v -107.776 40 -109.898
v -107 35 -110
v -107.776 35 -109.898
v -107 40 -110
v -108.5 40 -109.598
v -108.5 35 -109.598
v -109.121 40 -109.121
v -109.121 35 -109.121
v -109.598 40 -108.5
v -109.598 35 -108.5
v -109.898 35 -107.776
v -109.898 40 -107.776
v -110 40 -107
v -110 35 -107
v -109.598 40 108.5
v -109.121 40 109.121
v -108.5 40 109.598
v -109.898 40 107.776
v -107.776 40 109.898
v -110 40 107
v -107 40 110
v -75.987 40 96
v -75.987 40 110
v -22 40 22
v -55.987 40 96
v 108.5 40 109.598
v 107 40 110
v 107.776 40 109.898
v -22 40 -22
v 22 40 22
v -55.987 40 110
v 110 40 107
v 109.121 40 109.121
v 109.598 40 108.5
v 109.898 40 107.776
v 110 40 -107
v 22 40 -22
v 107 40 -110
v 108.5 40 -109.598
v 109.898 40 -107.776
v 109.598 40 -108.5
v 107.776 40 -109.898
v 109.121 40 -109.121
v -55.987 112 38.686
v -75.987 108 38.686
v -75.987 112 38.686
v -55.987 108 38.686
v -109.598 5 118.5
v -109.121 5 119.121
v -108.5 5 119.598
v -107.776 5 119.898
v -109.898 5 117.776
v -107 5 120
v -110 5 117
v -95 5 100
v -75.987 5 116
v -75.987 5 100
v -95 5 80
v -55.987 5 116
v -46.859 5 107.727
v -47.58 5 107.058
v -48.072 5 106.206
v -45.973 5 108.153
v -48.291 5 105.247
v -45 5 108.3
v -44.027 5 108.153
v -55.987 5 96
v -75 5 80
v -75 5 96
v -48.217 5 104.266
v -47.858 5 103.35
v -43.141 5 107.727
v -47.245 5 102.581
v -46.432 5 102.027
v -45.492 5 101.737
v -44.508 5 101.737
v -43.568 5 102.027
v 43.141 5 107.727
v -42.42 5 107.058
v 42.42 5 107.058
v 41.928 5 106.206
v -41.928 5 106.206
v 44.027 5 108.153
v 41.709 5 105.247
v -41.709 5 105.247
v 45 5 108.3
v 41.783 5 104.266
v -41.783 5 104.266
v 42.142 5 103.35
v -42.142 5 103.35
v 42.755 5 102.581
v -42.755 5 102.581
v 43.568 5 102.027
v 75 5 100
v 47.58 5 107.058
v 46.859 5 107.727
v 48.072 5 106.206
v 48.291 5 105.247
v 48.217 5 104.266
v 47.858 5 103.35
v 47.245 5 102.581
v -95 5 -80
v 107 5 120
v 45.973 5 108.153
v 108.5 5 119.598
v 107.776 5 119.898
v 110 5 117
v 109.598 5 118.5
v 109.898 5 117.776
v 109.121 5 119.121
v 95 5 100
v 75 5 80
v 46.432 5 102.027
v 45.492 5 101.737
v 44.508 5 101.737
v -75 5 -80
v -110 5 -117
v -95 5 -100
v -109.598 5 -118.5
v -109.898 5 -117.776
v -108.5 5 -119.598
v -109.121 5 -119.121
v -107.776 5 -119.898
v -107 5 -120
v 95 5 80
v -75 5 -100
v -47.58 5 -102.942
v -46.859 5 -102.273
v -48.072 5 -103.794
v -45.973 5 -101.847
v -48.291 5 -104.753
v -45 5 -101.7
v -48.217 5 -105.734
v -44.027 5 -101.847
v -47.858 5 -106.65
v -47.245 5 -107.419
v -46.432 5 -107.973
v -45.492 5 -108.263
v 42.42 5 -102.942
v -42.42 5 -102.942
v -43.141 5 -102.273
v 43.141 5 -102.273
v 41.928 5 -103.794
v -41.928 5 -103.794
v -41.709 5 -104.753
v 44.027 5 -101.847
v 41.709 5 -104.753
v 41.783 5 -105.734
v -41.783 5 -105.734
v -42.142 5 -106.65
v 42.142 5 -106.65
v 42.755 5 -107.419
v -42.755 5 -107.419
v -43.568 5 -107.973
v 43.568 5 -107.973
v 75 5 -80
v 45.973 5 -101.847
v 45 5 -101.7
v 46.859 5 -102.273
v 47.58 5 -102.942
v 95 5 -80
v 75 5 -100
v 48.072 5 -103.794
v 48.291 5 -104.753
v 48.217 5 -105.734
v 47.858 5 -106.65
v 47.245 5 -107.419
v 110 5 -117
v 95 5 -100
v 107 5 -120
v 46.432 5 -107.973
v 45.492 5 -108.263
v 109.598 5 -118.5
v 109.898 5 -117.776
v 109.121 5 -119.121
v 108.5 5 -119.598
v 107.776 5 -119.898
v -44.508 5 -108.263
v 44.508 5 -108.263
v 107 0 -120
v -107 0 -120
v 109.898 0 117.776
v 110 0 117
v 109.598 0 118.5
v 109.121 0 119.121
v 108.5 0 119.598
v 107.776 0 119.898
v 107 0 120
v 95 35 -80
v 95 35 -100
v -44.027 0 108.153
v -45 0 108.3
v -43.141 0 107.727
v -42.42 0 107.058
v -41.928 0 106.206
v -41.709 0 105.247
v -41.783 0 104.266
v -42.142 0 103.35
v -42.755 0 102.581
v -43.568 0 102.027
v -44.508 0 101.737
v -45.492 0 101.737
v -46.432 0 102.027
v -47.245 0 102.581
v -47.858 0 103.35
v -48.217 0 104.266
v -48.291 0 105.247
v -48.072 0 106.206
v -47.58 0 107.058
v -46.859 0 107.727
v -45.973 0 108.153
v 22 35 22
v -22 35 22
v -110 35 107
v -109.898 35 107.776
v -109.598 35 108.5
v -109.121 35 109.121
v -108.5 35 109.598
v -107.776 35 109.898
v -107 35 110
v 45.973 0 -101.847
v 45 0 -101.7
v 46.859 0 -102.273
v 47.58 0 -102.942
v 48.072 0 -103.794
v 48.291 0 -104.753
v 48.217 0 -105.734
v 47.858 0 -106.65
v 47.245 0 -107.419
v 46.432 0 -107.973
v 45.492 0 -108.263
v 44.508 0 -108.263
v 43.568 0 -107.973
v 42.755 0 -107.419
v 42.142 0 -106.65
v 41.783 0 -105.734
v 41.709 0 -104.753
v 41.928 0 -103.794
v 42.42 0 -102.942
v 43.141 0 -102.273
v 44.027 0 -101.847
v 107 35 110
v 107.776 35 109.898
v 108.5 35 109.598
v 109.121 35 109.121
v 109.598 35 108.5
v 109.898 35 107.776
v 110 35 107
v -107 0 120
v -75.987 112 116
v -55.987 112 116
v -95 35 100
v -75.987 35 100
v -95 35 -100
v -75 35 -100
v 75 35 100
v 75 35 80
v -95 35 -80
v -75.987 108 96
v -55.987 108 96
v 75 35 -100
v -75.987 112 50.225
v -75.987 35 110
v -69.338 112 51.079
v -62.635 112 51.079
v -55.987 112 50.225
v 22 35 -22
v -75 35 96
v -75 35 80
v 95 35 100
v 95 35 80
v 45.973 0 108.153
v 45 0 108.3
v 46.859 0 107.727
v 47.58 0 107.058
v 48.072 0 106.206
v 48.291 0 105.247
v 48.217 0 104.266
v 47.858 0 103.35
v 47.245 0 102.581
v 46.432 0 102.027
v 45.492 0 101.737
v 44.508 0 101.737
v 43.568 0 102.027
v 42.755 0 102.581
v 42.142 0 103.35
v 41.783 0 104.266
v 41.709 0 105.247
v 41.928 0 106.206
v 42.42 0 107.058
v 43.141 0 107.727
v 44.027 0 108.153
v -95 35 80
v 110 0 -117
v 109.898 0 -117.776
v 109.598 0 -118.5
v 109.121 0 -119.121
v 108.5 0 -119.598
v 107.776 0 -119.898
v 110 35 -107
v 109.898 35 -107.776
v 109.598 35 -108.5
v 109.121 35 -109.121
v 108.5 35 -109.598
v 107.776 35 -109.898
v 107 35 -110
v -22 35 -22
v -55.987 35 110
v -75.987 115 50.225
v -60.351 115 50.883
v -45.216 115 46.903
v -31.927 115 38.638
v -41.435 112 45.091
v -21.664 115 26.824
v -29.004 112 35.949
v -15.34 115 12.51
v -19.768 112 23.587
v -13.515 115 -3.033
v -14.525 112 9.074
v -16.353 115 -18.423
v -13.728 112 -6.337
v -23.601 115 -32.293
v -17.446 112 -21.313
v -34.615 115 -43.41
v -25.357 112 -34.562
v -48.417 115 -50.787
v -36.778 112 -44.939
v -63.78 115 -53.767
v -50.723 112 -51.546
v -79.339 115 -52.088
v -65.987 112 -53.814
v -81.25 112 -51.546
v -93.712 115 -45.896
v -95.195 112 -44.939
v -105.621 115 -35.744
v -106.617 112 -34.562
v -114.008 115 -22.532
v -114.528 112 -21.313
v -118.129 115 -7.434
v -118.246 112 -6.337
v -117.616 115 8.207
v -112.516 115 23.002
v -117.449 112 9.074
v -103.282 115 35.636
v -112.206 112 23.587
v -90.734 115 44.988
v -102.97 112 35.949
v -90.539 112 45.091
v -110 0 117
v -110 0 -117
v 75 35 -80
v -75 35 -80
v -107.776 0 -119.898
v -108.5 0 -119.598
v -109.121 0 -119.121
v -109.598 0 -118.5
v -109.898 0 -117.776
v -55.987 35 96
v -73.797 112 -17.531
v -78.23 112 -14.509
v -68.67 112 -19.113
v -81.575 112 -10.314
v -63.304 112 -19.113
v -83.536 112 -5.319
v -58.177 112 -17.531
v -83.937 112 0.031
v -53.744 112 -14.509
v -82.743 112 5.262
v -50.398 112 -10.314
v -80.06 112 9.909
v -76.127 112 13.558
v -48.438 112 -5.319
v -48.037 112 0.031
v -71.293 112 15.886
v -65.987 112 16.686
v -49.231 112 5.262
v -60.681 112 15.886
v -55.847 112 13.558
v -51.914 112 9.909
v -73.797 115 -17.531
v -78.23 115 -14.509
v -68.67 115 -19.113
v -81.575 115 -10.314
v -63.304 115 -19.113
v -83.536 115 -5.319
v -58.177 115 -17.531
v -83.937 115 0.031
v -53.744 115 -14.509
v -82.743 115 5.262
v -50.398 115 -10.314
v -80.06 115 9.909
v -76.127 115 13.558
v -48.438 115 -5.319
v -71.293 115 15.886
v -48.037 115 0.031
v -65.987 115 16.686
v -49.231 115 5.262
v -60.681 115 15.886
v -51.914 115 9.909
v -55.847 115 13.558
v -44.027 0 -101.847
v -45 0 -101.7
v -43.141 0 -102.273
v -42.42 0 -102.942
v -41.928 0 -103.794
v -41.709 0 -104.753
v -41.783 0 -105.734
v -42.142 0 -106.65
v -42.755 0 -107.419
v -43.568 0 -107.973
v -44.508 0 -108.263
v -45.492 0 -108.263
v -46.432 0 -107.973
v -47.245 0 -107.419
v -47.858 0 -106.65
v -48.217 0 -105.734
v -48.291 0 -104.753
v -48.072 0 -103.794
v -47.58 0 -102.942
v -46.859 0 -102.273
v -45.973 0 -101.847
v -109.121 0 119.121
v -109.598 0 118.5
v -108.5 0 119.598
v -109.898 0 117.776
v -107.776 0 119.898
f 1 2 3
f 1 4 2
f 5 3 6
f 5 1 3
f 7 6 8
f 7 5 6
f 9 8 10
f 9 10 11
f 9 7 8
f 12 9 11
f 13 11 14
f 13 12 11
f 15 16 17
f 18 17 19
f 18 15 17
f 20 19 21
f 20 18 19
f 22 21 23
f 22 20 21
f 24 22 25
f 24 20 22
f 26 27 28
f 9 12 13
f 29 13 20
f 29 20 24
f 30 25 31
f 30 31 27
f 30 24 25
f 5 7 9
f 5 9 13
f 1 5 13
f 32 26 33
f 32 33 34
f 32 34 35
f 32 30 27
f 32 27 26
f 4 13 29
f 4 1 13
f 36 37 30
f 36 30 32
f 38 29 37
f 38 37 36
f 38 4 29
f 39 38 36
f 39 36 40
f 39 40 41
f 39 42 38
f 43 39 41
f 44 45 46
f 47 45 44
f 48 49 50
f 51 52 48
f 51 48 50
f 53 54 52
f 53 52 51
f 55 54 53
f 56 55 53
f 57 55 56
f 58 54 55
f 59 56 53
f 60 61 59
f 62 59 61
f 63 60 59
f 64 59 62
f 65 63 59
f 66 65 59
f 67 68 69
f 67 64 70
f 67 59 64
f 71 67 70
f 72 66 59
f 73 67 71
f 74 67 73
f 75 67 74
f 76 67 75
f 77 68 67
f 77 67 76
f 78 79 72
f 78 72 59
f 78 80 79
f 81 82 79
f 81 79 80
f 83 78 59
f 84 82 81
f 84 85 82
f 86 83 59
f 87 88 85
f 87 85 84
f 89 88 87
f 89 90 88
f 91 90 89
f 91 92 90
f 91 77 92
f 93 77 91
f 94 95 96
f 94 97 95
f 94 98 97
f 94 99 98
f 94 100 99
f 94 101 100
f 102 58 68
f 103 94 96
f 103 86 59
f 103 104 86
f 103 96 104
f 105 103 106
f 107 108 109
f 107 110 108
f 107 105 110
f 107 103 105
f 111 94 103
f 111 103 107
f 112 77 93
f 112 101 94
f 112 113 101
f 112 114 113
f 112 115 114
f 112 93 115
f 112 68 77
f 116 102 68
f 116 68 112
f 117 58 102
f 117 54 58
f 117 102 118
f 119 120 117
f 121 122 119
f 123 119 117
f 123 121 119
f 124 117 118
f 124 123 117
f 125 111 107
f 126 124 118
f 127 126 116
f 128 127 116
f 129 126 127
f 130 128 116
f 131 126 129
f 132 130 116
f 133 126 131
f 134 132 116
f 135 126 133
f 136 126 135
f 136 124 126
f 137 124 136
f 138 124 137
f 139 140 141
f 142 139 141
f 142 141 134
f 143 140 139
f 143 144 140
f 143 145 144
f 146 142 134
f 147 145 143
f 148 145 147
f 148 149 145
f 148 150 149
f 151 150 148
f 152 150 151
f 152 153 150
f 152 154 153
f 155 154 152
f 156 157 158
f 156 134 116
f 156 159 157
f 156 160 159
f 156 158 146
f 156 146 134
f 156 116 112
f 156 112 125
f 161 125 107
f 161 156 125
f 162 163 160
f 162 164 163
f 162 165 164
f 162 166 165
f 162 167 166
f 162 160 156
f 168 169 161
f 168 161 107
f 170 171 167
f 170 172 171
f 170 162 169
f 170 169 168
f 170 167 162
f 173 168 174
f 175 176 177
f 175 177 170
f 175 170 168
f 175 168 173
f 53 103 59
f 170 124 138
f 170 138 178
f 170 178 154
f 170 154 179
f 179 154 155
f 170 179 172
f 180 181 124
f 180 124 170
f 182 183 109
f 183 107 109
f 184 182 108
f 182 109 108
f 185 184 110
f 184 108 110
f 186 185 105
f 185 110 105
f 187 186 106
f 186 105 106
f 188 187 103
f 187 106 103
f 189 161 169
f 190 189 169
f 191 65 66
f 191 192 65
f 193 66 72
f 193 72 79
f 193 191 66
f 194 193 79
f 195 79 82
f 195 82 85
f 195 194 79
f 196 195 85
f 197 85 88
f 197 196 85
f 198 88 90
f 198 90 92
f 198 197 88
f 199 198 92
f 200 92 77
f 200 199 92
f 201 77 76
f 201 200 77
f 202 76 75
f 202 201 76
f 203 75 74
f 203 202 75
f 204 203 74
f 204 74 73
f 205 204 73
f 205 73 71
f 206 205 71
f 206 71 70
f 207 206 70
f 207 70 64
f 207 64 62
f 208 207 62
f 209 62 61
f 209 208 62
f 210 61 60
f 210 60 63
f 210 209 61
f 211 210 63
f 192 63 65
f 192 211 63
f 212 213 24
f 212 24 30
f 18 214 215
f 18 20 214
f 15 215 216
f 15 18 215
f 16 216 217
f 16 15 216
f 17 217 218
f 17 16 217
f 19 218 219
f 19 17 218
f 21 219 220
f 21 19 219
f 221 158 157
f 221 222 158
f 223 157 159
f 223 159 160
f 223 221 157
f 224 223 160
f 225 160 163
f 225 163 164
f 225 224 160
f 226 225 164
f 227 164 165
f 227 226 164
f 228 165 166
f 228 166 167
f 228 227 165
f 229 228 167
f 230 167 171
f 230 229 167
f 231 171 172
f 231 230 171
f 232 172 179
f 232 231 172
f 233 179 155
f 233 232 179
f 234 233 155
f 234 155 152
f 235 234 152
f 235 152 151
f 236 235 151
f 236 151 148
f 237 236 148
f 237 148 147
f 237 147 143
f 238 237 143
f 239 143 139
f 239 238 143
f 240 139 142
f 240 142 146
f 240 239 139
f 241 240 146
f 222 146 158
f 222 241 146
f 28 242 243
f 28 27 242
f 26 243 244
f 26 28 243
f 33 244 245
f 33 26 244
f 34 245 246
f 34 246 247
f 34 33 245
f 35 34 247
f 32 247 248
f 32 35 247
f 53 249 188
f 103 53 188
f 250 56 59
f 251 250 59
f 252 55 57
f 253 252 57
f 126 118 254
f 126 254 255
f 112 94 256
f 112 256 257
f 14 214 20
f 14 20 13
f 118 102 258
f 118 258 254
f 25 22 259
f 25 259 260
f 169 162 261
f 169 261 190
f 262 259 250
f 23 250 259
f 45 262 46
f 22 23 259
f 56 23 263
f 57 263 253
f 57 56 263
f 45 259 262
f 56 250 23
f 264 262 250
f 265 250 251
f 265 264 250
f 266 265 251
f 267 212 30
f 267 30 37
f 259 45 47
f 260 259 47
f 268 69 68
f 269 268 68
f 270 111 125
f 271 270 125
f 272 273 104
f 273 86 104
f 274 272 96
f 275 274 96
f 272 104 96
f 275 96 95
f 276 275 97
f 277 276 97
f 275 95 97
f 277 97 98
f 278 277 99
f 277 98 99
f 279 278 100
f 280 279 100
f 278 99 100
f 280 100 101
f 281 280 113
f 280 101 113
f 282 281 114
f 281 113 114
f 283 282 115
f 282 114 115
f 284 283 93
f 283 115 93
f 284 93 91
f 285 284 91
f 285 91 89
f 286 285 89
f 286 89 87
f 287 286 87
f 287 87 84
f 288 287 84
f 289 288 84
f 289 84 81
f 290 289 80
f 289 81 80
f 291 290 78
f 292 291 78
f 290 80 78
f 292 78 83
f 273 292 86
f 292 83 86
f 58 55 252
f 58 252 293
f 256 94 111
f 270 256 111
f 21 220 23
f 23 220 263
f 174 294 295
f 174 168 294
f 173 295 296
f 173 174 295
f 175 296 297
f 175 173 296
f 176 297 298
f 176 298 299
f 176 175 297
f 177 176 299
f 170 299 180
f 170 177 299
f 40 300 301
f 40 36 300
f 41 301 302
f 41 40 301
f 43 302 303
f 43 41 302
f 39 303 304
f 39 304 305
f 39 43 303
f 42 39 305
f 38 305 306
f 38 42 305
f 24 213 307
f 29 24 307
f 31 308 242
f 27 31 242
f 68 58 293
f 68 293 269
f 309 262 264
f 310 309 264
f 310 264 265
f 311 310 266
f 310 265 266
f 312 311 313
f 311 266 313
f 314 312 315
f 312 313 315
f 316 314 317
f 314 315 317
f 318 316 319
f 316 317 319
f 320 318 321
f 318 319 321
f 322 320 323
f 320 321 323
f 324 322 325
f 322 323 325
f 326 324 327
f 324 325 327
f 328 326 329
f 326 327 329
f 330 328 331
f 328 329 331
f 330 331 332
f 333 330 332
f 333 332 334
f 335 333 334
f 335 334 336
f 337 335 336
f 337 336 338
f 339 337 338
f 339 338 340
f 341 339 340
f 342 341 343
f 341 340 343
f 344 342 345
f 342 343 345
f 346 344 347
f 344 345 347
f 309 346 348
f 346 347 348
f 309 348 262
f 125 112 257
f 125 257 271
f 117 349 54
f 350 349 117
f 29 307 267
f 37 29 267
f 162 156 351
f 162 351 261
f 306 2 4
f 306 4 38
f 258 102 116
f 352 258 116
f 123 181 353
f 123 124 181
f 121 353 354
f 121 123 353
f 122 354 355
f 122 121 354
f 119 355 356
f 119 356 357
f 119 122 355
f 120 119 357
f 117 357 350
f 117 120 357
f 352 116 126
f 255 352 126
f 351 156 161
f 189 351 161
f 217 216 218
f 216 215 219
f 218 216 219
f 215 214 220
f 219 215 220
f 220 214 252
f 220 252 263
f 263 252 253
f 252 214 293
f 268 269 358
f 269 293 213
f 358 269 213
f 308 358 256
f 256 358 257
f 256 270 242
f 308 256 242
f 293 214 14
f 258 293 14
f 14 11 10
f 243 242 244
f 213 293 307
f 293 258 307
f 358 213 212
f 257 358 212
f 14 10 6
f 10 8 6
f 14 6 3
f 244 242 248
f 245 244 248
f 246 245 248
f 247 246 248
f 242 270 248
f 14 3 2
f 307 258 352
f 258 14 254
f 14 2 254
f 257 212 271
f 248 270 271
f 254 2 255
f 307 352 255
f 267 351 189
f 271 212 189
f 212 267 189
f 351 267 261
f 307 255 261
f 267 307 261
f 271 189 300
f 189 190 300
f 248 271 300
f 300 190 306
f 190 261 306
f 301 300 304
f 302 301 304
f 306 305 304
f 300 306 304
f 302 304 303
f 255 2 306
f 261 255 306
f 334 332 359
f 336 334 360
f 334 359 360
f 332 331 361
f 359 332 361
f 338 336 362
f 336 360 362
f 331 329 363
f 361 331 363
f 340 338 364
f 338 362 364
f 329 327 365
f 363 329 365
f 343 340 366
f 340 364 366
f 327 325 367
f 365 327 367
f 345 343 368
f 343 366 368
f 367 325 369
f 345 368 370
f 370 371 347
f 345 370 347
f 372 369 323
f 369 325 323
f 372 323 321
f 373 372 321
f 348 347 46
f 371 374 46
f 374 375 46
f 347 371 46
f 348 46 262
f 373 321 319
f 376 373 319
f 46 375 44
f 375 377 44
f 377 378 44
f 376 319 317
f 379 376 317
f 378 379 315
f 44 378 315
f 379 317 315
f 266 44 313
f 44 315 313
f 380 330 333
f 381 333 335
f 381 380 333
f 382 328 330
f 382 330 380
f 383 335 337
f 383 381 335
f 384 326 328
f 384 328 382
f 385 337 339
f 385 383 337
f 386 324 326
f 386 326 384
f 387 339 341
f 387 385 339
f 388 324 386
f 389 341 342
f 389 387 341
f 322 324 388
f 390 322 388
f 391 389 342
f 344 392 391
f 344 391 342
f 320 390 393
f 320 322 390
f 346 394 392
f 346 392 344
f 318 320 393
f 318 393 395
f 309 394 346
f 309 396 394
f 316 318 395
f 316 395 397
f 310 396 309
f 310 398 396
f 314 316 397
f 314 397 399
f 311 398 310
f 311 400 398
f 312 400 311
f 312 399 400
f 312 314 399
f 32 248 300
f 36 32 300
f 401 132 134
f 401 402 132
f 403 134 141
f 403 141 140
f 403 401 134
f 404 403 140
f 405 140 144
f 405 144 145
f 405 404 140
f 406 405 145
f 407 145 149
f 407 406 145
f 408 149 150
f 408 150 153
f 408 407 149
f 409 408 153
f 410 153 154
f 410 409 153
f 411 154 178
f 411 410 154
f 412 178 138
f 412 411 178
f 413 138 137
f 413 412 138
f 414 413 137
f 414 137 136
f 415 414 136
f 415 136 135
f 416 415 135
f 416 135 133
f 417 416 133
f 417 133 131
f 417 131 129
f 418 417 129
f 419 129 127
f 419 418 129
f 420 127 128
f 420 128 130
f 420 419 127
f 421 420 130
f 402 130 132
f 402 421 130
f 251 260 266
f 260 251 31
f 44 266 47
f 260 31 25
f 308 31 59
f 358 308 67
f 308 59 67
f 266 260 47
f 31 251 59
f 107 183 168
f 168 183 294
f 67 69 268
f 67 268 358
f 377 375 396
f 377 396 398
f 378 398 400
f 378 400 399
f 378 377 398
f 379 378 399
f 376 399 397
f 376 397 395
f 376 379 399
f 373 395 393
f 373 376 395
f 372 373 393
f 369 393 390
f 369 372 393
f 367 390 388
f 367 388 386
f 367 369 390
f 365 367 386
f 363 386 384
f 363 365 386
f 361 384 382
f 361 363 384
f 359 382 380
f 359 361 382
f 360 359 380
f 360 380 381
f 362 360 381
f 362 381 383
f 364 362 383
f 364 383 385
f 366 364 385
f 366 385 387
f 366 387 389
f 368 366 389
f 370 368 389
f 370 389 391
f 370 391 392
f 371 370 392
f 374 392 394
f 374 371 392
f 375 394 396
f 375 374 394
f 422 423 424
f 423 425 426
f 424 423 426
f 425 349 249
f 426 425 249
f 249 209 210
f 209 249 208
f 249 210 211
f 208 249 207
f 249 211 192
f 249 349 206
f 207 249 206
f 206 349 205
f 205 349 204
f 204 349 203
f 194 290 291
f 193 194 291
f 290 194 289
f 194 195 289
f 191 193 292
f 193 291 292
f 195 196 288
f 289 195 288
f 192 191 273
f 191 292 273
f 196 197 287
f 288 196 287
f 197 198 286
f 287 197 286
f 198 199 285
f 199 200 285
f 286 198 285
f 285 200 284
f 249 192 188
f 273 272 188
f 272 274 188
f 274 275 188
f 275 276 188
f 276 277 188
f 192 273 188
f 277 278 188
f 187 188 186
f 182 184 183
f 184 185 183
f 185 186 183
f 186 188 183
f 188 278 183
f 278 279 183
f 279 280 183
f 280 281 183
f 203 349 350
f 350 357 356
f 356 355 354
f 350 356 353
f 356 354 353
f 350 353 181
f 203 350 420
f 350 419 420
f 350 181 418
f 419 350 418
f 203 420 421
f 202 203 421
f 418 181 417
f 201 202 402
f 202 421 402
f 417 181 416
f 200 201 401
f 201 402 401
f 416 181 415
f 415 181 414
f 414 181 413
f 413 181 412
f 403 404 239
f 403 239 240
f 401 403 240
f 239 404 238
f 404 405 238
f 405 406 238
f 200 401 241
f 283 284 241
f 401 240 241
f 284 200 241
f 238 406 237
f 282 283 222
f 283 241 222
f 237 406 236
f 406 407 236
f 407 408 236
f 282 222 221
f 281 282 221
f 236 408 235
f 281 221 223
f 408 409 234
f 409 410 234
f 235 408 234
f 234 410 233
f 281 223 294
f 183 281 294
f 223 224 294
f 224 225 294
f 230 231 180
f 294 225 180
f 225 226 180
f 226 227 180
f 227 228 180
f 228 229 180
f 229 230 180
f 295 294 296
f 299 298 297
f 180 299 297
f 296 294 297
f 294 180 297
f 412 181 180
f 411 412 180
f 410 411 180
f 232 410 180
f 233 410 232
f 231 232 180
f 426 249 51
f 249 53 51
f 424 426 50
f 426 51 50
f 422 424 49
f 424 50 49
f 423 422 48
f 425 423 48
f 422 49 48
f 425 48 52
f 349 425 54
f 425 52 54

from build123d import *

# Parameters (mm, degrees)
BASE_PLATE_PROFILE_W       = 220
BASE_PLATE_PROFILE_H       = 240
BASE_PLATE_DEPTH           = 5
STANDOFFS_START            = 5
STANDOFFS_PROFILE_W        = 20
STANDOFFS_PROFILE_H        = 20
STANDOFFS_DEPTH            = 30
HOLDER_START               = 35
HOLDER_SEAT_PROFILE_W      = 220
HOLDER_SEAT_PROFILE_H      = 220
HOLDER_SEAT_PROFILE_W_2    = 44
HOLDER_SEAT_PROFILE_H_2    = 44
HOLDER_SEAT_DEPTH          = 5
GUIDE_START                = 5
GUIDE_COLUMN_PROFILE_W     = 20
GUIDE_COLUMN_PROFILE_H     = 20
GUIDE_COLUMN_DEPTH         = 107
GUIDE_START_2              = 108
GUIDE_ARM_PROFILE_W        = 20
GUIDE_ARM_PROFILE_H        = 77.313861244
GUIDE_ARM_DEPTH            = 4
GUIDE_START_3              = 112
GUIDE_SEAT_PROFILE_R       = 52.5
GUIDE_SEAT_PROFILE_R_2     = 18
GUIDE_SEAT_DEPTH           = 3
BASE_START                 = 2.5
BASE_FIXING_HOLES_LAYOUT_R = 3.3
BASE_FIXING_HOLES_DEPTH    = 2.5
PLATE_CORNER_RADII_R       = 3


with BuildPart() as part:
    # Base Plate Profile → Base Plate (new body)
    with BuildSketch(Plane(origin=(0, 0, 0), x_dir=(1, 0, 0), z_dir=(0, 1, 0))):
        Rectangle(BASE_PLATE_PROFILE_W, BASE_PLATE_PROFILE_H)
    extrude(amount=BASE_PLATE_DEPTH)

    # Standoffs Profile → Standoffs (add)
    with BuildSketch(Plane(origin=(0, 0, 0), x_dir=(1, 0, 0), z_dir=(0, 1, 0)).offset(STANDOFFS_START)):
        with Locations((-85, 90)):
            Rectangle(STANDOFFS_PROFILE_W, STANDOFFS_PROFILE_H)
        with Locations((-85, -90)):
            Rectangle(STANDOFFS_PROFILE_W, STANDOFFS_PROFILE_H)
        with Locations((85, 90)):
            Rectangle(STANDOFFS_PROFILE_W, STANDOFFS_PROFILE_H)
        with Locations((85, -90)):
            Rectangle(STANDOFFS_PROFILE_W, STANDOFFS_PROFILE_H)
    extrude(amount=STANDOFFS_DEPTH)

    # Holder Seat Profile → Holder Seat (add)
    with BuildSketch(Plane(origin=(0, 0, 0), x_dir=(1, 0, 0), z_dir=(0, 1, 0)).offset(HOLDER_START)):
        Rectangle(HOLDER_SEAT_PROFILE_W, HOLDER_SEAT_PROFILE_H)
        Rectangle(HOLDER_SEAT_PROFILE_W_2, HOLDER_SEAT_PROFILE_H_2, mode=Mode.SUBTRACT)
    extrude(amount=HOLDER_SEAT_DEPTH)

    # Guide Column Profile → Guide Column (add)
    with BuildSketch(Plane(origin=(0, 0, 0), x_dir=(1, 0, 0), z_dir=(0, 1, 0)).offset(GUIDE_START)):
        with Locations((-65.986921194, -106)):
            Rectangle(GUIDE_COLUMN_PROFILE_W, GUIDE_COLUMN_PROFILE_H)
    extrude(amount=GUIDE_COLUMN_DEPTH)

    # Guide Arm Profile → Guide Arm (add)
    with BuildSketch(Plane(origin=(0, 0, 0), x_dir=(1, 0, 0), z_dir=(0, 1, 0)).offset(GUIDE_START_2)):
        with Locations((-65.986921194, -77.343069378)):
            Rectangle(GUIDE_ARM_PROFILE_W, GUIDE_ARM_PROFILE_H)
    extrude(amount=GUIDE_ARM_DEPTH)

    # Guide Seat Profile → Guide Seat (add)
    with BuildSketch(Plane(origin=(0, 0, 0), x_dir=(1, 0, 0), z_dir=(0, 1, 0)).offset(GUIDE_START_3)):
        with Locations(Location((-65.986921194, 1.313861244, 0), (0, 0, 259.019424572))):
            Circle(GUIDE_SEAT_PROFILE_R)
        with Locations(Location((-65.986921194, 1.313861244, 0), (0, 0, 270))):
            Circle(GUIDE_SEAT_PROFILE_R_2, mode=Mode.SUBTRACT)
    extrude(amount=GUIDE_SEAT_DEPTH)

    # Base Fixing Holes Layout → Base Fixing Holes (cut, symmetric)
    with BuildSketch(Plane(origin=(0, 0, 0), x_dir=(1, 0, 0), z_dir=(0, 1, 0)).offset(BASE_START)):
        with Locations(Location((-45, 105, 0), (0, 0, 270))):
            Circle(BASE_FIXING_HOLES_LAYOUT_R)
        with Locations(Location((-45, -105, 0), (0, 0, 270))):
            Circle(BASE_FIXING_HOLES_LAYOUT_R)
        with Locations(Location((45, 105, 0), (0, 0, 270))):
            Circle(BASE_FIXING_HOLES_LAYOUT_R)
        with Locations(Location((45, -105, 0), (0, 0, 270))):
            Circle(BASE_FIXING_HOLES_LAYOUT_R)
    extrude(amount=BASE_FIXING_HOLES_DEPTH, both=True, mode=Mode.SUBTRACT)

    # Plate Corner Radii
    plate_corner_radii_edges = [part.edges().sort_by_distance(p)[0] for p in [
        (-110, 37.5, -110),
        (-110, 37.5, 110),
        (110, 37.5, 110),
        (110, 37.5, -110),
        (-110, 2.5, -120),
        (110, 2.5, -120),
        (110, 2.5, 120),
        (-110, 2.5, 120),
    ]]
    fillet(plate_corner_radii_edges, radius=PLATE_CORNER_RADII_R)


solid = part.part
